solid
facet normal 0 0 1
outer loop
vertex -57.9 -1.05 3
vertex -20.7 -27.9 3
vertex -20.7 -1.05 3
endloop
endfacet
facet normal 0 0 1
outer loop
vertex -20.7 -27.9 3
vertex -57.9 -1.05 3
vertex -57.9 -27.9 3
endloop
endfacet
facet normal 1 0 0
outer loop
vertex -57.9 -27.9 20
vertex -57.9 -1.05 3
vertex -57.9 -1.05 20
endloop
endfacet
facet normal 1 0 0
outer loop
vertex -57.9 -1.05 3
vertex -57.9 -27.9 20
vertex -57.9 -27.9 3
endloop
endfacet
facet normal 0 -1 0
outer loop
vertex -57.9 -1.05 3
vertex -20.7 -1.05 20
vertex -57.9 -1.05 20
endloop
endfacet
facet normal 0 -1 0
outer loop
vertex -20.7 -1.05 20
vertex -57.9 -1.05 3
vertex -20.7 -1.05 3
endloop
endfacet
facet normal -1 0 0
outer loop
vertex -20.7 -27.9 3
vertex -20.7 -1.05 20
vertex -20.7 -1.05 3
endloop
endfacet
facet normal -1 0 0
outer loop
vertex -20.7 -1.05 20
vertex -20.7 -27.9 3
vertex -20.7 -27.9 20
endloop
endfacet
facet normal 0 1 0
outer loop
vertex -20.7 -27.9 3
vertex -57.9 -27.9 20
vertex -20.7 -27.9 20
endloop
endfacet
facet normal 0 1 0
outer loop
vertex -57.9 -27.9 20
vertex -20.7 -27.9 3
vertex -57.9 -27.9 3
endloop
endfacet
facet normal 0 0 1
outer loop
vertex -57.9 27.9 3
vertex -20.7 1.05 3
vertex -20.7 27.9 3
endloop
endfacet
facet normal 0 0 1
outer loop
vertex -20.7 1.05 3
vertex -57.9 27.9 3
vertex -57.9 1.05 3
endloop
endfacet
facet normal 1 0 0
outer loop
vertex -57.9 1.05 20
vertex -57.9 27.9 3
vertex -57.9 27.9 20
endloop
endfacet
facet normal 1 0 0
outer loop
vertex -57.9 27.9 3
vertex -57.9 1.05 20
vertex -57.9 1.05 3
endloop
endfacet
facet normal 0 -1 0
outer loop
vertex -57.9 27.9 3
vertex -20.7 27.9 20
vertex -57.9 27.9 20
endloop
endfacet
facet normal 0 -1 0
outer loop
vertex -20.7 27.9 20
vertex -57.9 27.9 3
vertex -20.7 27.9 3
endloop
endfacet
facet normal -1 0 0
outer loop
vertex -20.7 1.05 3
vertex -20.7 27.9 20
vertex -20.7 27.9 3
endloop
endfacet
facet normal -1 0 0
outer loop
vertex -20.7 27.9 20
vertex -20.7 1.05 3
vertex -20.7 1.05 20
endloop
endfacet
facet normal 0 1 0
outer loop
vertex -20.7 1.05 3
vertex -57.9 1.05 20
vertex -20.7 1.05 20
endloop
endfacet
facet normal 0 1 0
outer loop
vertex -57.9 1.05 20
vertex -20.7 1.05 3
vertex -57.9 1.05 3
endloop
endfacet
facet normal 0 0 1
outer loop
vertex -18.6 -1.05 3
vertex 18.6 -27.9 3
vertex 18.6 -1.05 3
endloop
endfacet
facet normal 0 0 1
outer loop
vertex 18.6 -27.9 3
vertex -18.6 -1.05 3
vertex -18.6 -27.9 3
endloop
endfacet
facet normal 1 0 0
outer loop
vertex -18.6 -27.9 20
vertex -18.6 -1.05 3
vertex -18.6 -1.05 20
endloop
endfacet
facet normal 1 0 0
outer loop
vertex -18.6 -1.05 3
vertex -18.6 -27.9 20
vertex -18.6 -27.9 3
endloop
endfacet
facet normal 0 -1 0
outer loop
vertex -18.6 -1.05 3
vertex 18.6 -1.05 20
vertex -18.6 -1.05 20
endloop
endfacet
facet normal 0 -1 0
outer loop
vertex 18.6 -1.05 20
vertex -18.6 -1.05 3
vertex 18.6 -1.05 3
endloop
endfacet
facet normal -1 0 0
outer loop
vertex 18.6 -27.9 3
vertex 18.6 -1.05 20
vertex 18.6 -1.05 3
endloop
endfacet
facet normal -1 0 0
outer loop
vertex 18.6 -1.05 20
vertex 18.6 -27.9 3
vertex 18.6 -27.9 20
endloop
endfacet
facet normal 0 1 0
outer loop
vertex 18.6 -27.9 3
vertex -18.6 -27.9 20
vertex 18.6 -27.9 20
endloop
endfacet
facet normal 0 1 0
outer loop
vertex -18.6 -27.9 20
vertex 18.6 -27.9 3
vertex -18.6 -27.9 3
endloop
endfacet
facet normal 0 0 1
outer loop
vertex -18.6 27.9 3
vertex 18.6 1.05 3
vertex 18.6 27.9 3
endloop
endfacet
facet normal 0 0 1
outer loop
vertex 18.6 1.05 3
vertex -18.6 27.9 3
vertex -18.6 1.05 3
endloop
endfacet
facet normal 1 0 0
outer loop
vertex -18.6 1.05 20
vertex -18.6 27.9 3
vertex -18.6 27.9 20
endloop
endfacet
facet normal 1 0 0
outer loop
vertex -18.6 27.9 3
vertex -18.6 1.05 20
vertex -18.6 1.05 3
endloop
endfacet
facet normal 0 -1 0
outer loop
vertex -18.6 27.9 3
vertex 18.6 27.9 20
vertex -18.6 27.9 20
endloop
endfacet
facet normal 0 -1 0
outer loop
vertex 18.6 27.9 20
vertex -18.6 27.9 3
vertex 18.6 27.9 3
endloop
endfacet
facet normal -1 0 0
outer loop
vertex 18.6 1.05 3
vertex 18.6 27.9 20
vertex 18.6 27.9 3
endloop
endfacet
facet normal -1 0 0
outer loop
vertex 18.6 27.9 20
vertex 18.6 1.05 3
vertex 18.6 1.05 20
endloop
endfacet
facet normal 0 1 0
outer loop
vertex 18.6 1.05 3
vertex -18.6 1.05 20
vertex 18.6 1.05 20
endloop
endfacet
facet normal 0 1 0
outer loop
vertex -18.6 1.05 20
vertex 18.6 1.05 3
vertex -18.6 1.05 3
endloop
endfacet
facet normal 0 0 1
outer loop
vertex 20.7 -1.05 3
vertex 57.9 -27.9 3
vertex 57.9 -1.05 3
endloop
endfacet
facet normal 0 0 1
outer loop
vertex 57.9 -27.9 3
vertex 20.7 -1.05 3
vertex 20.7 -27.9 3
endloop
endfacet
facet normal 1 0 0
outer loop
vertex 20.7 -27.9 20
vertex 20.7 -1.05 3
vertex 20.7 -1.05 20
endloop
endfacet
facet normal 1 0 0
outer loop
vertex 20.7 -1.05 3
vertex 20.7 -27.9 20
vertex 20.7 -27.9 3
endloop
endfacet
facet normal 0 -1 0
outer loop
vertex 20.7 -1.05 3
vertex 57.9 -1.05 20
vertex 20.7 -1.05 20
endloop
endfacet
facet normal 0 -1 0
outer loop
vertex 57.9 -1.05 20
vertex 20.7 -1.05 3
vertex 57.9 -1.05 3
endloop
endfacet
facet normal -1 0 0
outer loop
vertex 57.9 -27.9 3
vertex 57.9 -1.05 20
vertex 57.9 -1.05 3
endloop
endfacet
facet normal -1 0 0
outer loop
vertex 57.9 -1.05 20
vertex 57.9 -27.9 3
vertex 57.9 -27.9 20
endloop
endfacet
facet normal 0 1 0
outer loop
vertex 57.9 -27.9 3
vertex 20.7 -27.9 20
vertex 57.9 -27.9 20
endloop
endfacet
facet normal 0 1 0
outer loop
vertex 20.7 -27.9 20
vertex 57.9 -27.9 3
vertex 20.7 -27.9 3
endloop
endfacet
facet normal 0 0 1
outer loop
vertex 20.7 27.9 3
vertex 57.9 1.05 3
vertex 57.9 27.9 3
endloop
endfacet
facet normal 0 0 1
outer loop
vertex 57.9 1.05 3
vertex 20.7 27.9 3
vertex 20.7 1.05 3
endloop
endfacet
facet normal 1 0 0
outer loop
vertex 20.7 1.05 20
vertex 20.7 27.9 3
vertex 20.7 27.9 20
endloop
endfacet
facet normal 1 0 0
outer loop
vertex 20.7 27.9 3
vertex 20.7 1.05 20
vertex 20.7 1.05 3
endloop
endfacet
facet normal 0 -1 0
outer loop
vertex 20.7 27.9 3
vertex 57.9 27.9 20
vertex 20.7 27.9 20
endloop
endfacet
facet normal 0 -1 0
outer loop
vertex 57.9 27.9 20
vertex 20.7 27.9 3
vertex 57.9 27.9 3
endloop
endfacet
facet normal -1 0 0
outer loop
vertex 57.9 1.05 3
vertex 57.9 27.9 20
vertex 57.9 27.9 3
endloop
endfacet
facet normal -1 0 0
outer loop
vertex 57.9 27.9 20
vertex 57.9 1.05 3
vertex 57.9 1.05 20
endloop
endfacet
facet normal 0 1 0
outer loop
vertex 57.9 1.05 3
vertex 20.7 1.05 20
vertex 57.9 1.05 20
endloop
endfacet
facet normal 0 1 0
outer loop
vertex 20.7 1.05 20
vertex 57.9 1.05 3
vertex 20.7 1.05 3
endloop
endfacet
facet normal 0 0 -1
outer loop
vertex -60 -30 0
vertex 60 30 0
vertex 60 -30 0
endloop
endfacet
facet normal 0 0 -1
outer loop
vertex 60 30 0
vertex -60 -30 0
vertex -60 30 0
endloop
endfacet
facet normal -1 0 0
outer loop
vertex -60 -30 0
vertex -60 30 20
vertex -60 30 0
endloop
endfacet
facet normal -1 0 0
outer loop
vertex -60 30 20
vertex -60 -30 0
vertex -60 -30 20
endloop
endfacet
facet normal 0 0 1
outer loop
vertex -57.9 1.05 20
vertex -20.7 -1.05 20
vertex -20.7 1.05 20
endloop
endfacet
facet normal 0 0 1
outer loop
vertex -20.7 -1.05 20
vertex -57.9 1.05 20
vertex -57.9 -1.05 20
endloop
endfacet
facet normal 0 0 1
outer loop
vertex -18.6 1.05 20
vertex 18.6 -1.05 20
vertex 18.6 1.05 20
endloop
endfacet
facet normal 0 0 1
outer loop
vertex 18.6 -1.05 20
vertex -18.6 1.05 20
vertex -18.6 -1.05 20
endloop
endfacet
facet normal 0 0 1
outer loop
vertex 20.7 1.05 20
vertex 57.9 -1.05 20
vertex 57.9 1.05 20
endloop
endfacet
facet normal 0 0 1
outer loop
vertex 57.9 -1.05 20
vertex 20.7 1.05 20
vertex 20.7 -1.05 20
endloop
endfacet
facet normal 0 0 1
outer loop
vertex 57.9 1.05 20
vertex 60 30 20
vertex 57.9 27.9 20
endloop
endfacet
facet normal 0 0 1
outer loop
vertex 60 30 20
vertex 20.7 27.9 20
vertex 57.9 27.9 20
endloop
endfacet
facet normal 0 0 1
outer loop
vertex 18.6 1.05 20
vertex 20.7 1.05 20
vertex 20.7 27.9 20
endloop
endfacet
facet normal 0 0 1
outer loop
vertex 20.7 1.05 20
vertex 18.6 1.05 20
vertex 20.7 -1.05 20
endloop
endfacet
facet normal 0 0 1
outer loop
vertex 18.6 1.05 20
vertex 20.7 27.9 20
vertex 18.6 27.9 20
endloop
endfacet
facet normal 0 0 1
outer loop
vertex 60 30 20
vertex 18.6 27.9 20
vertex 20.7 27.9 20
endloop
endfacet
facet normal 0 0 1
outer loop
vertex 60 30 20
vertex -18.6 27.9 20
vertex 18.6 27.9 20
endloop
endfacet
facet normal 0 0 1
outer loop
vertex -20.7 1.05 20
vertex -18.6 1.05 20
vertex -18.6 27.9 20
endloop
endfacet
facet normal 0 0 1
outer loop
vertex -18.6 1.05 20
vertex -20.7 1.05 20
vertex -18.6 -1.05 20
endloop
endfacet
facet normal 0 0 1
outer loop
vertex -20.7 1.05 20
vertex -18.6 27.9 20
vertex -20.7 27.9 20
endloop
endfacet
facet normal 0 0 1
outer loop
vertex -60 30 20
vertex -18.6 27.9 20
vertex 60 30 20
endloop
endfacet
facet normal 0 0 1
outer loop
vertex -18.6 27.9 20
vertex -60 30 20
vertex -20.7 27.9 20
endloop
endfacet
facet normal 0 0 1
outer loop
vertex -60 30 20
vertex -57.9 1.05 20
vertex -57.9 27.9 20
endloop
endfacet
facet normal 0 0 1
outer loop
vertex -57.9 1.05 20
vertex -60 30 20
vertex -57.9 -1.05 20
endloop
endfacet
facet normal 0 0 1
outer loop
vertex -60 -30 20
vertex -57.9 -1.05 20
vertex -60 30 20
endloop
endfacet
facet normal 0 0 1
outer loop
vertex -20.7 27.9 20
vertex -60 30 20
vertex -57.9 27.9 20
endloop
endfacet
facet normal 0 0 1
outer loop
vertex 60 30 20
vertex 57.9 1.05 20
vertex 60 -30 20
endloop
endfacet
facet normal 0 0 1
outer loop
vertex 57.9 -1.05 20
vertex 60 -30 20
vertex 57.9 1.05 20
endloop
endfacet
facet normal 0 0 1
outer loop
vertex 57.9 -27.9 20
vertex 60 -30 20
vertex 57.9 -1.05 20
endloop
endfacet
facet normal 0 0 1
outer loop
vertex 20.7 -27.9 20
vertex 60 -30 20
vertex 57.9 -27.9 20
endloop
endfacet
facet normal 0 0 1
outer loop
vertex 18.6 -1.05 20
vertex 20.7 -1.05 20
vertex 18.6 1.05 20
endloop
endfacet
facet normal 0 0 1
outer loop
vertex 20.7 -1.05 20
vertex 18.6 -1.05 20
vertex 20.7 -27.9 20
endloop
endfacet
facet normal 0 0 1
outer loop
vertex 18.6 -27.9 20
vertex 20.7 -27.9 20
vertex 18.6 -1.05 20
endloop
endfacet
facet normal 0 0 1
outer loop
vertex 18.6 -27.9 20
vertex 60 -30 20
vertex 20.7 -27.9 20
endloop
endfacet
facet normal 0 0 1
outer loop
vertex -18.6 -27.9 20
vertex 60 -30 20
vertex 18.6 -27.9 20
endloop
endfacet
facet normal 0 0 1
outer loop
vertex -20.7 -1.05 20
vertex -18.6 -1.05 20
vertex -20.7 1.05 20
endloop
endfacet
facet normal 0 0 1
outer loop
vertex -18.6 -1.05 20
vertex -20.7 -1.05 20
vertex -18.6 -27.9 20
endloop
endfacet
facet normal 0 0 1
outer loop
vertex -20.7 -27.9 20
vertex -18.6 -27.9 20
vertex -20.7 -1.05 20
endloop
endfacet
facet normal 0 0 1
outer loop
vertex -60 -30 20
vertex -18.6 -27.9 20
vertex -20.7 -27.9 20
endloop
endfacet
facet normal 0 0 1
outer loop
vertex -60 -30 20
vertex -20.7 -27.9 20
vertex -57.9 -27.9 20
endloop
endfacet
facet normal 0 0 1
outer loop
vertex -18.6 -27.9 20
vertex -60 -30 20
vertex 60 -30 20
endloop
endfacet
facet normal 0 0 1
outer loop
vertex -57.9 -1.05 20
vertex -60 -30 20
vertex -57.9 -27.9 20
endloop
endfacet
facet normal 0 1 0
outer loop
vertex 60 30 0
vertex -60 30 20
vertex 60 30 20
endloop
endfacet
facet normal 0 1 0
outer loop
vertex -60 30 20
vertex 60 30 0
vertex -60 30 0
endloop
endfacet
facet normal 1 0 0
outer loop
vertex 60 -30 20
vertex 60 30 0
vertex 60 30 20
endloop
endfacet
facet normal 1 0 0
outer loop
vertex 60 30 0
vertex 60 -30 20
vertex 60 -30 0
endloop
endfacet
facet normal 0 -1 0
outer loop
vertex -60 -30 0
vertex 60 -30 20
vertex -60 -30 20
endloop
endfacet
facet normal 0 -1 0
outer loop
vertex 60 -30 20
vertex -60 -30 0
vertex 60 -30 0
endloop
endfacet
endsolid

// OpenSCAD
ovDims=[120,60,20];
floorThck=3;
colRows=[3,2];
wallThck=2.1;

cutOutDims=[(ovDims.x-(colRows.x+1)*wallThck)/colRows.x,(ovDims.y-(colRows.y+1)*wallThck)/colRows.y];

difference(){
  linear_extrude(ovDims.z) square([ovDims.x,ovDims.y],true);
  #for (ix=[-(colRows.x-1)/2:(colRows.x-1)/2],iy=[-(colRows.y-1)/2,(colRows.y-1)/2]){
    translate([ix*(cutOutDims.x+wallThck),iy*(cutOutDims.y+wallThck),floorThck]) 
      linear_extrude(ovDims.z) square(cutOutDims,true);
    echo(ix,iy);
    }
}
